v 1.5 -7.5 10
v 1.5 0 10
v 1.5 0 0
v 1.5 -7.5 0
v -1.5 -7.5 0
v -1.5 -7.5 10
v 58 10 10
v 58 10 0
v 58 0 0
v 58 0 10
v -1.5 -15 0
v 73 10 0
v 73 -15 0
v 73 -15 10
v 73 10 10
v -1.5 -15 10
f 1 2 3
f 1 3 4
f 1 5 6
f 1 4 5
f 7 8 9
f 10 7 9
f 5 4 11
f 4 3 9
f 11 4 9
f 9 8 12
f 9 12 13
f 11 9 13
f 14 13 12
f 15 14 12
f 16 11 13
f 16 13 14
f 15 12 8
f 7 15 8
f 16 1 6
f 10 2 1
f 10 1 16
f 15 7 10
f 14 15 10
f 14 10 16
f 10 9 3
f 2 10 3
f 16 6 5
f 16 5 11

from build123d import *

# Parameters (mm, degrees)
F1_DEPTH = 10
F2_W     = 7.5
F2_H     = 10
F3_DEPTH = 1.5
F4_W     = 7.5
F4_H     = 10
F5_DEPTH = 1.5


with BuildPart() as f1:
    # F0 (on Top) → F1 (new body)
    with BuildSketch(Plane.XY):
        Polygon((58, 0), (0, 0), (0, -15), (73, -15), (73, 10), (58, 10), align=None)
    extrude(amount=F1_DEPTH)

    # F2 (on face) → F3 (cut)
    with BuildSketch(Plane(origin=(0, 0, 0), x_dir=(0, -1, 0), z_dir=(-1, 0, 0))):
        with Locations((3.75, 5)):
            Rectangle(F2_W, F2_H)
    extrude(amount=-F3_DEPTH, mode=Mode.SUBTRACT)

    # F4 (on face) → F5 (join)
    with BuildSketch(Plane(origin=(0, 0, 0), x_dir=(0, -1, 0), z_dir=(-1, 0, 0))):
        with Locations((11.25, 5)):
            Rectangle(F4_W, F4_H)
    extrude(amount=F5_DEPTH)


solid = f1.part
